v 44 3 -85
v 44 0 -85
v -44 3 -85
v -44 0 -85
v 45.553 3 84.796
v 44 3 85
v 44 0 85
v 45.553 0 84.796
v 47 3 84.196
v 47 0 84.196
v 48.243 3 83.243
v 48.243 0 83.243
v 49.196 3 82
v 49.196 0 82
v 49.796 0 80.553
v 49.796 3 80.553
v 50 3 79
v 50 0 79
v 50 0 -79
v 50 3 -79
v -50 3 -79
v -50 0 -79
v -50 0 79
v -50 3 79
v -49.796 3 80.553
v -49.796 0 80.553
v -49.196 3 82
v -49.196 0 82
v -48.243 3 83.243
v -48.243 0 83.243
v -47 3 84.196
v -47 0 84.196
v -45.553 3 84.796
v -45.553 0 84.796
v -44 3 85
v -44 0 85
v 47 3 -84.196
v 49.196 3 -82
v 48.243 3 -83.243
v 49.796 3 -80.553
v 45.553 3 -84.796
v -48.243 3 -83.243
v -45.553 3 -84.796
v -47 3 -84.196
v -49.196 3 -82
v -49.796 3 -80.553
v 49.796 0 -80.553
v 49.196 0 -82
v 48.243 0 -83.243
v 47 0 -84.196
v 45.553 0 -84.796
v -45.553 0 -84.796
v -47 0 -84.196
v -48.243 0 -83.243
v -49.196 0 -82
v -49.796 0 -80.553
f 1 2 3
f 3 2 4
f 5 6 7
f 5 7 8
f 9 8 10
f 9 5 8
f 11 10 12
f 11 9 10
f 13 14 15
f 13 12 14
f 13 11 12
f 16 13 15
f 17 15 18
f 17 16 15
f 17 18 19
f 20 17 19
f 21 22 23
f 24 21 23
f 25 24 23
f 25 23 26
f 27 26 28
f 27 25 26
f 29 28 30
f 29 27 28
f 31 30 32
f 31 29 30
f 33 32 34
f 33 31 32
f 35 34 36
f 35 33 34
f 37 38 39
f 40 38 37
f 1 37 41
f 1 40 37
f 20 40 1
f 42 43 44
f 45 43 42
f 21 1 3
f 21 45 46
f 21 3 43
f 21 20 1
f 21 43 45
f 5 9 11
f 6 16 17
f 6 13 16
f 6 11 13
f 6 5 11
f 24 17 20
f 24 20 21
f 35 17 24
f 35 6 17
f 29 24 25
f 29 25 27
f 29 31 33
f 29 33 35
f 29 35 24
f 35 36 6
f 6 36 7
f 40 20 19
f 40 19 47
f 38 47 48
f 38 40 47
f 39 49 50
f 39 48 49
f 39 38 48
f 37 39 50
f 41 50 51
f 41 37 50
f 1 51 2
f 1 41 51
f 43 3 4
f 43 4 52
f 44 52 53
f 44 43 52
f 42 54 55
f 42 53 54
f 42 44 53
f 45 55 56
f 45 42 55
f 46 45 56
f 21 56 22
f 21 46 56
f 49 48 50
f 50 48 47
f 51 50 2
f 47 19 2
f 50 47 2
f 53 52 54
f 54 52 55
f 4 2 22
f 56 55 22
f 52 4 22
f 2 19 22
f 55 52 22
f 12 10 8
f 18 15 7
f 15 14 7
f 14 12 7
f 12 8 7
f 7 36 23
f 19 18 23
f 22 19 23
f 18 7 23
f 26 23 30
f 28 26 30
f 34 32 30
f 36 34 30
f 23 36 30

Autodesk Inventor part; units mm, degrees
ref_plane "YZ Plane" through (0, 0, 0) normal (1, 0, 0) x (0, 1, 0)
ref_plane "XZ Plane" through (0, 0, 0) normal (0, 1, 0) x (-1, 0, 0)
ref_plane "XY Plane" through (0, 0, 0) normal (0, 0, 1) x (1, 0, 0)
sketch "Sketch1" plane through (0, 0, 0) normal (0, 1, 0) x (-1, 0, 0)
  line L0 (50, 85) -> (-50, 85)
  line L1 (-50, 85) -> (-50, -85)
  line L2 (-50, -85) -> (50, -85)
  line L3 (50, -85) -> (50, 85)
  line L4 (50, 85) -> (-50, -85) construction
  point P0 (0, 0)
  point P1 (0, 0)
  dimension "d0" = 100
  dimension "d1" = 170
extrude "Plate1" add sketch "Sketch1" along normal blind 3
fillet "Corner Round1" radius 6 4 edges at (50, 1.5, 85) (-50, 1.5, 85) (50, 1.5, -85) (-50, 1.5, -85)
equation "\"BendReliefWidth\" = Thickness"
equation "\"BendReliefDepth\" = 0.5 * Thickness"
equation "\"CornerReliefSize\" = 4 * Thickness"
equation "\"MinimumRemnant\" = 2 * Thickness"
equation "\"TransitionRadius\" = BendRadius"
equation "\"JacobiRadiusSize\" = BendRadius"
equation "\"GapSize\" = Thickness"
properties part number "MSC 905 flange base tube support" material "Stainless Steel"
